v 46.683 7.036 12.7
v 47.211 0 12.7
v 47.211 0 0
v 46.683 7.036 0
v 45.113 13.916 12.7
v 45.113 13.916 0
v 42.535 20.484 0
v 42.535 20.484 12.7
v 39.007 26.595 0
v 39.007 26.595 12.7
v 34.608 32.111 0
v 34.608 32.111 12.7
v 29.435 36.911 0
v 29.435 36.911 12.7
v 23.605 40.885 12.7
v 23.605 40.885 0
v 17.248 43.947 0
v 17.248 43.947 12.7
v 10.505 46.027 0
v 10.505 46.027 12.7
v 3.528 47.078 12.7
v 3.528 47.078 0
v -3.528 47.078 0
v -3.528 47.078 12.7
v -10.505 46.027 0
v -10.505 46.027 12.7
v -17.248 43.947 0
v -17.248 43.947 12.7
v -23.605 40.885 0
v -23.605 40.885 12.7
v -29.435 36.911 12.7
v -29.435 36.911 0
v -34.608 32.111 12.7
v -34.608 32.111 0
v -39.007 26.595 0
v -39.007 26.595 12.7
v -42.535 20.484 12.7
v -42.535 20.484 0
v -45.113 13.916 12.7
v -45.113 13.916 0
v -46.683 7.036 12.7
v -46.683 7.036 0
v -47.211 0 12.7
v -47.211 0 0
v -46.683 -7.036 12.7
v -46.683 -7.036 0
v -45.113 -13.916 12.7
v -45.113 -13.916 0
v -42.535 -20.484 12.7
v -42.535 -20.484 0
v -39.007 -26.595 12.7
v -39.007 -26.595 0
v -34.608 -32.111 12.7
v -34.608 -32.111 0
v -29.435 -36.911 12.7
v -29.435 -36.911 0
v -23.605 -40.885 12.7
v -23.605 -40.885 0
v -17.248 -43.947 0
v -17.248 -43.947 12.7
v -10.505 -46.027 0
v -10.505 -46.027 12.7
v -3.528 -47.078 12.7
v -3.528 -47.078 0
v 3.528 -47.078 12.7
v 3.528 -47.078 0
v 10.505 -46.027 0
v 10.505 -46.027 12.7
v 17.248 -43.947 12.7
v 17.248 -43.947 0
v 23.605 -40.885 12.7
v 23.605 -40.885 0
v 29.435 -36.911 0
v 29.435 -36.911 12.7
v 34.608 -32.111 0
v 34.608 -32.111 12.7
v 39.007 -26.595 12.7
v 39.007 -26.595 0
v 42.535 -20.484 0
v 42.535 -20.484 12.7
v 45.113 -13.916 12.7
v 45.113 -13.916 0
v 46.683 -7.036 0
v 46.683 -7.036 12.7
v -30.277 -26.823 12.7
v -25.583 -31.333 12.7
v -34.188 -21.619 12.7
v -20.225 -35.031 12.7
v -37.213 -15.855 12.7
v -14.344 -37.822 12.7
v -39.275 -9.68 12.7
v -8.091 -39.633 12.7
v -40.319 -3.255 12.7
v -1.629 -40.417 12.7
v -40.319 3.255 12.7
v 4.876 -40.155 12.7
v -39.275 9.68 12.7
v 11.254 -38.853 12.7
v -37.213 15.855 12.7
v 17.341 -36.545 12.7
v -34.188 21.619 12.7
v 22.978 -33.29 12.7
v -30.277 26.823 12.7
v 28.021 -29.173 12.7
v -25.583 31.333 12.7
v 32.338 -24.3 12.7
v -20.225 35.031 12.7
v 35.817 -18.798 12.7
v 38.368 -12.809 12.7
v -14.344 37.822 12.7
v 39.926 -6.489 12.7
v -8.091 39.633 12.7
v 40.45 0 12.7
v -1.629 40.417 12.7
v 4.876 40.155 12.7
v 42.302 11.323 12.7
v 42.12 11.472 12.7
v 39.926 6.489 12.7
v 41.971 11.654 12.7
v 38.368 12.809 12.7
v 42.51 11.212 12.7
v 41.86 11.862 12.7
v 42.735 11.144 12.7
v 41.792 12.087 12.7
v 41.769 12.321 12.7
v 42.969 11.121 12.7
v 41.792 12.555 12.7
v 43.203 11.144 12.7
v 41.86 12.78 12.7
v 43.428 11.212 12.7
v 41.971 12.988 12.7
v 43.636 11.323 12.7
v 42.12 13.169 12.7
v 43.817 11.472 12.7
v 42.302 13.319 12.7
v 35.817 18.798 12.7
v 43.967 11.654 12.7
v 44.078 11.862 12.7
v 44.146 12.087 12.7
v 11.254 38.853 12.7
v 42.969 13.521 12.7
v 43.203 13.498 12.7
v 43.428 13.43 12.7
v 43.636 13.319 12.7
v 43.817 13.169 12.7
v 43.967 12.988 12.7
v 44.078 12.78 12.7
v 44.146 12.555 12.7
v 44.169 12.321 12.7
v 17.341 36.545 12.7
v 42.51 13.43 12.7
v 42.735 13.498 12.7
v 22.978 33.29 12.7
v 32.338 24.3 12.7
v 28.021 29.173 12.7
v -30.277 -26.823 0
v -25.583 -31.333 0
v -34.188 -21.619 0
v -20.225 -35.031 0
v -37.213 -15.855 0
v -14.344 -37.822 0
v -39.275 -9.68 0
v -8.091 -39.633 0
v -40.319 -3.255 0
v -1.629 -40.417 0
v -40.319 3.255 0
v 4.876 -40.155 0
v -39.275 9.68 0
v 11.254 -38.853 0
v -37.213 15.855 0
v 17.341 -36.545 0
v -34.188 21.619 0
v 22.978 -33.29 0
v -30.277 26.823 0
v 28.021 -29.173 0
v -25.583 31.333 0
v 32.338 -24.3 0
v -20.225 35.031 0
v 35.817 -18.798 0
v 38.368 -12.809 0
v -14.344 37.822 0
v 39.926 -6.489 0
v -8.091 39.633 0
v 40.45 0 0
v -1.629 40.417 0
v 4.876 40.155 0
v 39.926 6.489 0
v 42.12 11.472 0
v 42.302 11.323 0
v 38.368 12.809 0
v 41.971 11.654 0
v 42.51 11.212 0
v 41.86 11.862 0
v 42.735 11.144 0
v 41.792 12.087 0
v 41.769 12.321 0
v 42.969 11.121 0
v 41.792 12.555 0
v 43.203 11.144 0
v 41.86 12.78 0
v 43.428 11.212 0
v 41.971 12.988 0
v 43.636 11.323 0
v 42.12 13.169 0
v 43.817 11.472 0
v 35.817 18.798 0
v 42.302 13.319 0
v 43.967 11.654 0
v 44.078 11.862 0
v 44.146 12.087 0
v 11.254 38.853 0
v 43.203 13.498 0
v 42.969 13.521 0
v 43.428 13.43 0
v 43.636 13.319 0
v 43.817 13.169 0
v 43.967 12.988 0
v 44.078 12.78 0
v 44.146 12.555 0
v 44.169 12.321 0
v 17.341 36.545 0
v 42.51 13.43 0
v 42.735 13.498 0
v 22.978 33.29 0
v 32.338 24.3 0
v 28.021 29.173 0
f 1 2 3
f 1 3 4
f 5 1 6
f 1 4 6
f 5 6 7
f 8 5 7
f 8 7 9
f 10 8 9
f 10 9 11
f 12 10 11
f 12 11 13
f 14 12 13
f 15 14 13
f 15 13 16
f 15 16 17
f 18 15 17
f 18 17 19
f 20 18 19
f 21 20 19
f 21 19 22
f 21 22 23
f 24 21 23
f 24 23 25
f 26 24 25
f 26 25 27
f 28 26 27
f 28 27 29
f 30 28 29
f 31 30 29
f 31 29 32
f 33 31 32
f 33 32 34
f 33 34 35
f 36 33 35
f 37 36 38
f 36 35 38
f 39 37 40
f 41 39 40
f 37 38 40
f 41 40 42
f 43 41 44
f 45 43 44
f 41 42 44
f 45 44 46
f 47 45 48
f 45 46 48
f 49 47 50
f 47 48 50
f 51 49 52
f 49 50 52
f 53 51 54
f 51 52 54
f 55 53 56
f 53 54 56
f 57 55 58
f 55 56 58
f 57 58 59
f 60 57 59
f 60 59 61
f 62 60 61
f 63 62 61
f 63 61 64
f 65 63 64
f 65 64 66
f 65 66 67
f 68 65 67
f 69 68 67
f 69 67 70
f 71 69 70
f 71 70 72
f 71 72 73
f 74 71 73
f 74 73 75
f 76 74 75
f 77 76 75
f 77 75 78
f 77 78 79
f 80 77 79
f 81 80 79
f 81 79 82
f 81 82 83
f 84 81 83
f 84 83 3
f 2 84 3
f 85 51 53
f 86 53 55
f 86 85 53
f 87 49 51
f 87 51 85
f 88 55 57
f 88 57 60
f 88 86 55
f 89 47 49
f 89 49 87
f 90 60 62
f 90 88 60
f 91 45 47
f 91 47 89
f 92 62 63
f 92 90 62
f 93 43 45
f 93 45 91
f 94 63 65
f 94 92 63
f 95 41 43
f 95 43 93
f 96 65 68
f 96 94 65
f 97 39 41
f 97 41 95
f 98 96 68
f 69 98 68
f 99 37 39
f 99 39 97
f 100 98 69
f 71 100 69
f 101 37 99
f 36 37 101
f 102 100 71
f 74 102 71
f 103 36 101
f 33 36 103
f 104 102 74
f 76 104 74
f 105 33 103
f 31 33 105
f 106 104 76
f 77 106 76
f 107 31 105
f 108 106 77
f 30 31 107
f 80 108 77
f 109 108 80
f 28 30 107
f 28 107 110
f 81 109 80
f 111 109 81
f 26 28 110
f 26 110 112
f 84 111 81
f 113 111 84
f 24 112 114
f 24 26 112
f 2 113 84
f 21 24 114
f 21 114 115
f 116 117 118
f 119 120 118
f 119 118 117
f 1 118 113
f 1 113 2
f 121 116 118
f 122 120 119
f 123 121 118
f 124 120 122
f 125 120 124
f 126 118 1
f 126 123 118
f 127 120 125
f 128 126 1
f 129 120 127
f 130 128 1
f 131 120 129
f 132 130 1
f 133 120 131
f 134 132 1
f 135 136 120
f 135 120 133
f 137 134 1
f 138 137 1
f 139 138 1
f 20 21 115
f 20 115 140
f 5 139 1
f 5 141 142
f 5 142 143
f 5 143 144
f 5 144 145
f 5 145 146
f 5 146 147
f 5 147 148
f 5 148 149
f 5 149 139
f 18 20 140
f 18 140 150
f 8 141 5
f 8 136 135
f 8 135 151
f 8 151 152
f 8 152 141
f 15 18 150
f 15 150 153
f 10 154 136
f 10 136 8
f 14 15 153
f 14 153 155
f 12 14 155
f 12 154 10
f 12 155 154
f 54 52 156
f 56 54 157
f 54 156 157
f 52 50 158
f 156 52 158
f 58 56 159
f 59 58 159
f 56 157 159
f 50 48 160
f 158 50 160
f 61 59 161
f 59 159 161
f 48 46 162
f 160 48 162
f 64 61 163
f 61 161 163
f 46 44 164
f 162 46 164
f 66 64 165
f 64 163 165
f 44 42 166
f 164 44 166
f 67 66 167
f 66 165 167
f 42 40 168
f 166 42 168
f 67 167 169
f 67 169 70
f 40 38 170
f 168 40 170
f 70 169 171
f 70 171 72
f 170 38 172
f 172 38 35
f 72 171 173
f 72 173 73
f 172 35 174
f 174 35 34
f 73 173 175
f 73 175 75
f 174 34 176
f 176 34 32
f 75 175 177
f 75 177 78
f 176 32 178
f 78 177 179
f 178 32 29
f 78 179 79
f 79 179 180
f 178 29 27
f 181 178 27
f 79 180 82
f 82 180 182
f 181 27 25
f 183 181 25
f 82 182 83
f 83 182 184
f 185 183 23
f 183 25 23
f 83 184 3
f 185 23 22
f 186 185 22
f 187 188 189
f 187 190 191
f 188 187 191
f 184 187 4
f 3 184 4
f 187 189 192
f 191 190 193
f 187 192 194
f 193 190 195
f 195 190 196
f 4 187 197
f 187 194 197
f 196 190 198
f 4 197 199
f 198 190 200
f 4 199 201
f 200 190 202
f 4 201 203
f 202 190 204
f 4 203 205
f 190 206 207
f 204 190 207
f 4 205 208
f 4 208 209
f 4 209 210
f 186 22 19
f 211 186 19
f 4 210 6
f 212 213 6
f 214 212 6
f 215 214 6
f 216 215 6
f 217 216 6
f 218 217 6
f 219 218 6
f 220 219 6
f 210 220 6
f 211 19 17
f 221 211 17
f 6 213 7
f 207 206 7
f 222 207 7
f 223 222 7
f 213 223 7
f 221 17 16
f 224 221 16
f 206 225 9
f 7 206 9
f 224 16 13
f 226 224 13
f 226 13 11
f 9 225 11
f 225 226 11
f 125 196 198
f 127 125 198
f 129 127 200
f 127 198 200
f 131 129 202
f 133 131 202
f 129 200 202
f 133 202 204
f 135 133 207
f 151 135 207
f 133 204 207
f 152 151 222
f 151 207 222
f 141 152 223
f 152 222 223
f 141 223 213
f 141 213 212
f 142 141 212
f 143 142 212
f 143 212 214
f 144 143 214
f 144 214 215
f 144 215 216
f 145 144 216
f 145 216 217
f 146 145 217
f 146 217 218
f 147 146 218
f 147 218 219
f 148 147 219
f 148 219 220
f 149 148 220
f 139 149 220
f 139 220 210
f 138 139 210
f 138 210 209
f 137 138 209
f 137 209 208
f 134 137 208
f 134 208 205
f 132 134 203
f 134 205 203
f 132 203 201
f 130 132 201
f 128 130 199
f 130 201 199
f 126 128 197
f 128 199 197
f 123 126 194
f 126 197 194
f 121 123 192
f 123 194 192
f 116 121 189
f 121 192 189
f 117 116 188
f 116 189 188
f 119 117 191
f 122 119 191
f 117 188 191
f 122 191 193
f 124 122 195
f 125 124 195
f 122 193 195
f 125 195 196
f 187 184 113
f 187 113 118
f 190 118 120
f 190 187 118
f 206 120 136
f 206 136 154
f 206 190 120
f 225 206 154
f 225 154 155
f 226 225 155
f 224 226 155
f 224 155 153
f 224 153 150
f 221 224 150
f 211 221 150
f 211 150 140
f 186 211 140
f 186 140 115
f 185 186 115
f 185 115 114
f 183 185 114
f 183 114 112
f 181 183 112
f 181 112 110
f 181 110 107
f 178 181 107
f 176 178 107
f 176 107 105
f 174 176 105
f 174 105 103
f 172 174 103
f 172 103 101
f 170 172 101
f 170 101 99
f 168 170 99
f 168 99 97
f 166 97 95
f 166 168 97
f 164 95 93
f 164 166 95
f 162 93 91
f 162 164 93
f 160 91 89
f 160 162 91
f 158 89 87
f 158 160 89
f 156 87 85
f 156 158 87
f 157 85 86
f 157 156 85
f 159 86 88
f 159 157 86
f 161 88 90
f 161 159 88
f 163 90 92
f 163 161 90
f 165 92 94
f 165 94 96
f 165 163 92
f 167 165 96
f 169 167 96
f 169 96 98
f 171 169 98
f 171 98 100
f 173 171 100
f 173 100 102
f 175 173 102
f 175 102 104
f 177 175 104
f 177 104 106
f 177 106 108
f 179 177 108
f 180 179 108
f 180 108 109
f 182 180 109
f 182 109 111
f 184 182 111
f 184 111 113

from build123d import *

# Parameters (mm, degrees)
F0_R     = 47.2105080962
F0_R_2   = 40.4501471724
F1_DEPTH = 25.4
F2_DEPTH = 12.7
F4_D     = 2.4


with BuildPart() as f1:
    # F0 (on Top) → F1 (new body)
    with BuildSketch(Plane.XY):
        Circle(F0_R)
        Circle(F0_R_2, mode=Mode.SUBTRACT)
    extrude(amount=F1_DEPTH)

    # F2 (cut): a face of the model
    f2_faces = [f1.faces().sort_by_distance(p)[0] for p in [
        (-45.8751932795, 0, 25.4),
    ]]
    extrude(f2_faces, amount=-F2_DEPTH, mode=Mode.SUBTRACT)

    # F4 (through all)
    with Locations(Plane.XY.offset(12.7)):
        with Locations((42.9688580334, 12.3208649457)):
            Hole(F4_D / 2)


solid = f1.part
